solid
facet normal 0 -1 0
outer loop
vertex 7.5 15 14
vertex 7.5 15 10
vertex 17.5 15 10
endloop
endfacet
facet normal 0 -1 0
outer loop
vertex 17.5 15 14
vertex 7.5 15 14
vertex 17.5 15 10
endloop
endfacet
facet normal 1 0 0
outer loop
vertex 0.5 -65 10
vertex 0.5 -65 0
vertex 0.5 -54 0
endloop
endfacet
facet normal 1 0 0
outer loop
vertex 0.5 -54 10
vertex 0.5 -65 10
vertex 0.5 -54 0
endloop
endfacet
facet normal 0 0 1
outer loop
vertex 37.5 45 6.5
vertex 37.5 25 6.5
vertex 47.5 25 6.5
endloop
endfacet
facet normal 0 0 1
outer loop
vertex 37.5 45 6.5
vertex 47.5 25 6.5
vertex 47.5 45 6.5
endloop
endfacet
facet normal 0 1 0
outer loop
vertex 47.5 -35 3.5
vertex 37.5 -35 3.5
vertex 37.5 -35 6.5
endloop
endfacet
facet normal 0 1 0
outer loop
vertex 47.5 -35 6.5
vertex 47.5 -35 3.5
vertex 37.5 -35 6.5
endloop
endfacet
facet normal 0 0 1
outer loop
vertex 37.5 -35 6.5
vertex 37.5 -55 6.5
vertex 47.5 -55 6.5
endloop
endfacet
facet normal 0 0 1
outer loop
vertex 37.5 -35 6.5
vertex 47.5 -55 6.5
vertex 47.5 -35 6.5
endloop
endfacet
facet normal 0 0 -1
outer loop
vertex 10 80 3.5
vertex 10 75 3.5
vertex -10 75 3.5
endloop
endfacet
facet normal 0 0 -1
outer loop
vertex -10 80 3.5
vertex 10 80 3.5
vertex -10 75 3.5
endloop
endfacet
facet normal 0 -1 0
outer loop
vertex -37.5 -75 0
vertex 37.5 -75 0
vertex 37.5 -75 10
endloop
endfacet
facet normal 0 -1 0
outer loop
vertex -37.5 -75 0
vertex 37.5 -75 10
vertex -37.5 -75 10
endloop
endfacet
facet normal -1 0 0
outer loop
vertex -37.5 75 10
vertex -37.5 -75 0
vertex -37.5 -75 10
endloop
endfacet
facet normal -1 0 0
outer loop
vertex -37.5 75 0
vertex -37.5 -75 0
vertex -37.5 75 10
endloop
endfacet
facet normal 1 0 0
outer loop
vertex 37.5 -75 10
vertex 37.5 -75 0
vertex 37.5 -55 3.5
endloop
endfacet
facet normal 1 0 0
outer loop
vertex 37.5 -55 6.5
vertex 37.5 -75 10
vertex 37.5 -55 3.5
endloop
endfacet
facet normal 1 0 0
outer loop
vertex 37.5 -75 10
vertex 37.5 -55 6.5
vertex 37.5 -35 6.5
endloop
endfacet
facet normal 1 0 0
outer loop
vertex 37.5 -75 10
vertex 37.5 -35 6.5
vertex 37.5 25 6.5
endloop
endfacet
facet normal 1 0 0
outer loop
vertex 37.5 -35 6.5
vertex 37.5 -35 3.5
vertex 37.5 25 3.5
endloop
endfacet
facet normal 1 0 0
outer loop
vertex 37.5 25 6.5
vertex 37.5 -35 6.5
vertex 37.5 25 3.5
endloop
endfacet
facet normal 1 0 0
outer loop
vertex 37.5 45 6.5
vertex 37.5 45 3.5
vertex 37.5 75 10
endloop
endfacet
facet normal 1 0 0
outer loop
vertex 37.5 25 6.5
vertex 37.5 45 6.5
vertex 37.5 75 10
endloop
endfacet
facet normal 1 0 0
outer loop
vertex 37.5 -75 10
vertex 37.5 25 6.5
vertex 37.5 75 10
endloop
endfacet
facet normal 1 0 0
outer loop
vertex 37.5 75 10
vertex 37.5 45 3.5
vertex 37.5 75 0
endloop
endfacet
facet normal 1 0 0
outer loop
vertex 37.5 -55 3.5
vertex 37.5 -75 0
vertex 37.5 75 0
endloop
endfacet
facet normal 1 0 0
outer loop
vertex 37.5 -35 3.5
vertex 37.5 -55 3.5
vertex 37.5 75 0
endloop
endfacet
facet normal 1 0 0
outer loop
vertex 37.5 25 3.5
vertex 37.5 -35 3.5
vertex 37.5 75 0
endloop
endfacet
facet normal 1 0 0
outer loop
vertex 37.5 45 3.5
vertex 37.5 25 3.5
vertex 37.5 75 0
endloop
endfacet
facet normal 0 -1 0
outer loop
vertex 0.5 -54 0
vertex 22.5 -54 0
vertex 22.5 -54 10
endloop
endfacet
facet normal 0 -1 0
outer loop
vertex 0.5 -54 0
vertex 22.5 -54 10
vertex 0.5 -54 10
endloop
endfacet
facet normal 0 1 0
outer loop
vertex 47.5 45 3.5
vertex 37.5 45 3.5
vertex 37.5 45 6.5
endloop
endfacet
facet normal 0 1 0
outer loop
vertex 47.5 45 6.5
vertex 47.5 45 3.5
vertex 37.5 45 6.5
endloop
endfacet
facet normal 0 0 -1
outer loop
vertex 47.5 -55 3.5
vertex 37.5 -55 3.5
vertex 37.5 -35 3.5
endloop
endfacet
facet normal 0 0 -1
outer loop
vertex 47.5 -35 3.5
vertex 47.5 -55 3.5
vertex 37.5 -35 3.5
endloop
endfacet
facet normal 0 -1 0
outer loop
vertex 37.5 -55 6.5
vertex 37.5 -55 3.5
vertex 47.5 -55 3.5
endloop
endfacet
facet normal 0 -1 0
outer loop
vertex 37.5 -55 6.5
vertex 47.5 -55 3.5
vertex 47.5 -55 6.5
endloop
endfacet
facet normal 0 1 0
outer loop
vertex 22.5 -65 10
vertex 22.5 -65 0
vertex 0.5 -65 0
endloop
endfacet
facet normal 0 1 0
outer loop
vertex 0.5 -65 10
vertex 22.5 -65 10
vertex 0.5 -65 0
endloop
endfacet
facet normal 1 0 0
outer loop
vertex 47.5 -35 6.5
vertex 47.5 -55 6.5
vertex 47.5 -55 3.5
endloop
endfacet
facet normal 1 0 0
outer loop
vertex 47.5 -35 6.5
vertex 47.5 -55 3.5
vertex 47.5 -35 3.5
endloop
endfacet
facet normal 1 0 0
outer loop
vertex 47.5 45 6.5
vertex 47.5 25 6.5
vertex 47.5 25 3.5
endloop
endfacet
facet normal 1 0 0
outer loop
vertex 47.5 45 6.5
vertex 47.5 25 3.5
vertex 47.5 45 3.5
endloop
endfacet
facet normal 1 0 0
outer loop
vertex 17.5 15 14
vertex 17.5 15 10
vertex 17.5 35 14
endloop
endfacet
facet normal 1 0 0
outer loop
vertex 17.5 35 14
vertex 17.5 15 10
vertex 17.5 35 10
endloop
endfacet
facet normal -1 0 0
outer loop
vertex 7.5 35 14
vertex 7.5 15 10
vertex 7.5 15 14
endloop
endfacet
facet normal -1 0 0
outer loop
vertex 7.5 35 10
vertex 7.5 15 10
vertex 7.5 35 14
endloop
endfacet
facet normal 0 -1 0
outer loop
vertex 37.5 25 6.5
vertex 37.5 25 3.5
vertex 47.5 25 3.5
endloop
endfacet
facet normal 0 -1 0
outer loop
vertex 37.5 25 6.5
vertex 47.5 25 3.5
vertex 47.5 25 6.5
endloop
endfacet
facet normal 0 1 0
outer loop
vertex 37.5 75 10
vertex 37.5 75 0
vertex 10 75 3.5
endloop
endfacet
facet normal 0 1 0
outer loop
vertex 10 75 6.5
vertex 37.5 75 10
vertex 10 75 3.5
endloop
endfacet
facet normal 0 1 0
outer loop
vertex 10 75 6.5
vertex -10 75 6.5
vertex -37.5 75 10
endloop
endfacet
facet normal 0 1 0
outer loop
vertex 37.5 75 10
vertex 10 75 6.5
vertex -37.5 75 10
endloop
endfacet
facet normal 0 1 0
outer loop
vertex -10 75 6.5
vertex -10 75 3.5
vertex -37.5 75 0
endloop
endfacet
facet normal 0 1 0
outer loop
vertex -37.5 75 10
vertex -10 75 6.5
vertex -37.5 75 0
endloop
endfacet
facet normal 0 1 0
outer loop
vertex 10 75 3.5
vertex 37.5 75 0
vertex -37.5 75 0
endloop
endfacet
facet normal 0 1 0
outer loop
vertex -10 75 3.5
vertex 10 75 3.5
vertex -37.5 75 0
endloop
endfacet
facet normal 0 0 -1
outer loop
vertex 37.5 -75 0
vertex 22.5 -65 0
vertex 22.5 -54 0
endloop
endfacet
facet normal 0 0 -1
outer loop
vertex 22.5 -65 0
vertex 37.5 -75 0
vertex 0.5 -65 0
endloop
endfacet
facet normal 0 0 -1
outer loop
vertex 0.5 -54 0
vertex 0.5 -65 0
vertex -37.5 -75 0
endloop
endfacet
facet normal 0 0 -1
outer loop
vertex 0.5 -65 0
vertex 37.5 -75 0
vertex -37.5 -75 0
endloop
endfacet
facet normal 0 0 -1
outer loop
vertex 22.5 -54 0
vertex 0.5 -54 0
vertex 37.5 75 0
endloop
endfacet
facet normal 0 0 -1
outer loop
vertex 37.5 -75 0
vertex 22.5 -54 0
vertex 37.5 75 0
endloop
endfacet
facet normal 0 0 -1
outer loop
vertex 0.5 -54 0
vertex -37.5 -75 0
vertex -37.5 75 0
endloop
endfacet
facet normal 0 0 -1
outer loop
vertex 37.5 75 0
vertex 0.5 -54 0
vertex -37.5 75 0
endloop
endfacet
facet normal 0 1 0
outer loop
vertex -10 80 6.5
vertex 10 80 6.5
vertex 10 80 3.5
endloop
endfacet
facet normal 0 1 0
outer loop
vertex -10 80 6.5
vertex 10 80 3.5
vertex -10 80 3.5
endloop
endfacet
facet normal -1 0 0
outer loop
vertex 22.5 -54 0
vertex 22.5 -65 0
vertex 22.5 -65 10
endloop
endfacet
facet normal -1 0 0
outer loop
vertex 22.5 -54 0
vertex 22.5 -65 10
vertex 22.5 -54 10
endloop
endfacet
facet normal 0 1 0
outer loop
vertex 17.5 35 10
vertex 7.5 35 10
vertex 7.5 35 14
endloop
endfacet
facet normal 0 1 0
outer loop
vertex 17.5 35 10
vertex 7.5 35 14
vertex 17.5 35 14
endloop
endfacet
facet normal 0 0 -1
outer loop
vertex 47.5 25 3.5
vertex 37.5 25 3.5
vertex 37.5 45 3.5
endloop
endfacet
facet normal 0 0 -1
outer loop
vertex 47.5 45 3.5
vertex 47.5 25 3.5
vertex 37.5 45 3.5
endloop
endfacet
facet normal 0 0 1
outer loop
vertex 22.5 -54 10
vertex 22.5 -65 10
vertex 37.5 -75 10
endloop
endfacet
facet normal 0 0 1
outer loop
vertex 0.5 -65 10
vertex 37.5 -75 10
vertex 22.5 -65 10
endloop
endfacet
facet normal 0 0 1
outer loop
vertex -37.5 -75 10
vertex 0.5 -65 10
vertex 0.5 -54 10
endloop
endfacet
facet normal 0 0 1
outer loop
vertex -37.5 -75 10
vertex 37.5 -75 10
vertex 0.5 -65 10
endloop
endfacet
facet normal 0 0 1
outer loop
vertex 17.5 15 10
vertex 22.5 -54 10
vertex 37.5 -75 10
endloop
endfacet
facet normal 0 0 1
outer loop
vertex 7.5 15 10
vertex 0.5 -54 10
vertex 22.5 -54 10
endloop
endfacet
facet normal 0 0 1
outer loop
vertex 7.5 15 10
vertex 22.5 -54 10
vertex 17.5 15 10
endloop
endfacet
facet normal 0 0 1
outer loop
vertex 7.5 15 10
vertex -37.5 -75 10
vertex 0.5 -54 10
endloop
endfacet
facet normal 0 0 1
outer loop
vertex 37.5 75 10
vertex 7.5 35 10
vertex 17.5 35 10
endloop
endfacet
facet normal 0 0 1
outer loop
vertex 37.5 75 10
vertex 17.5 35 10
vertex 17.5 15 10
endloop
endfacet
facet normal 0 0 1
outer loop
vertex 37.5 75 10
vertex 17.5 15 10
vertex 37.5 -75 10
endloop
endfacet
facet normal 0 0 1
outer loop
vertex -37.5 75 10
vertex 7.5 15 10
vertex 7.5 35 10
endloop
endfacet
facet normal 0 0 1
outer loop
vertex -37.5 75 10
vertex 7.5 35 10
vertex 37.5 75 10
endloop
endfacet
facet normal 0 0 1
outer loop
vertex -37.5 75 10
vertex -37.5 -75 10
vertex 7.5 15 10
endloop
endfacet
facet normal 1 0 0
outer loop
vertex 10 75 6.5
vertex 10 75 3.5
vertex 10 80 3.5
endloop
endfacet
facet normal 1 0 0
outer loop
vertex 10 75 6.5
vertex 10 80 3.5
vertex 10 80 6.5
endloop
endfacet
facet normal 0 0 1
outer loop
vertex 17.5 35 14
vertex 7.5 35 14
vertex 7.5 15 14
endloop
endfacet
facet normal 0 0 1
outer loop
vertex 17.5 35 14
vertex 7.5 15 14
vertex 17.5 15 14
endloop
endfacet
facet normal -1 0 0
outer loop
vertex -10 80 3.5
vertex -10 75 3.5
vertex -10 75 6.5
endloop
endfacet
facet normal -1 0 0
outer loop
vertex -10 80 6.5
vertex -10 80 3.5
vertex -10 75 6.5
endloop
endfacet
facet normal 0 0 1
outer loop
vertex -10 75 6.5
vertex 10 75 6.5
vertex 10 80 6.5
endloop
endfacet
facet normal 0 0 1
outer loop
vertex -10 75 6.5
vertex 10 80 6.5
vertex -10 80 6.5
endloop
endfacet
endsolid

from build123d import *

# Parameters (mm, degrees)
SKETCH1_W           = 150
SKETCH1_H           = 75
SKETCH1_W_2         = 11
SKETCH1_H_2         = 22
BOSS_EXTRUDE1_DEPTH = 10
SKETCH2_W           = 10
SKETCH2_H           = 20
BOSS_EXTRUDE2_DEPTH = 4
SKETCH3_W           = 20
SKETCH3_H           = 3
BOSS_EXTRUDE3_DEPTH = 10
SKETCH4_W           = 20
SKETCH4_H           = 3
BOSS_EXTRUDE4_DEPTH = 5


with BuildPart() as part:
    # Sketch1 → Boss-Extrude1 (new body)
    with BuildSketch(Plane(origin=(0, 0, 0), x_dir=(0, 1, 0), z_dir=(0, 0, 1))):
        Rectangle(SKETCH1_W, SKETCH1_H)
        with Locations((-59.5, -11.5)):
            Rectangle(SKETCH1_W_2, SKETCH1_H_2, mode=Mode.SUBTRACT)
    extrude(amount=BOSS_EXTRUDE1_DEPTH)

    # Sketch2 → Boss-Extrude2 (add)
    with BuildSketch(Plane.XY.offset(10)):
        with Locations((12.5, 25)):
            Rectangle(SKETCH2_W, SKETCH2_H)
    extrude(amount=BOSS_EXTRUDE2_DEPTH)

    # Sketch3 → Boss-Extrude3 (add)
    with BuildSketch(Plane.YZ.offset(37.5)):
        with Locations((-45, 5)):
            Rectangle(SKETCH3_W, SKETCH3_H)
        with Locations((35, 5)):
            Rectangle(SKETCH3_W, SKETCH3_H)
    extrude(amount=BOSS_EXTRUDE3_DEPTH)

    # Sketch4 → Boss-Extrude4 (add)
    with BuildSketch(Plane(origin=(0, 75, 0), x_dir=(-1, 0, 0), z_dir=(0, 1, 0))):
        with Locations((0, 5)):
            Rectangle(SKETCH4_W, SKETCH4_H)
    extrude(amount=BOSS_EXTRUDE4_DEPTH)


solid = part.part
